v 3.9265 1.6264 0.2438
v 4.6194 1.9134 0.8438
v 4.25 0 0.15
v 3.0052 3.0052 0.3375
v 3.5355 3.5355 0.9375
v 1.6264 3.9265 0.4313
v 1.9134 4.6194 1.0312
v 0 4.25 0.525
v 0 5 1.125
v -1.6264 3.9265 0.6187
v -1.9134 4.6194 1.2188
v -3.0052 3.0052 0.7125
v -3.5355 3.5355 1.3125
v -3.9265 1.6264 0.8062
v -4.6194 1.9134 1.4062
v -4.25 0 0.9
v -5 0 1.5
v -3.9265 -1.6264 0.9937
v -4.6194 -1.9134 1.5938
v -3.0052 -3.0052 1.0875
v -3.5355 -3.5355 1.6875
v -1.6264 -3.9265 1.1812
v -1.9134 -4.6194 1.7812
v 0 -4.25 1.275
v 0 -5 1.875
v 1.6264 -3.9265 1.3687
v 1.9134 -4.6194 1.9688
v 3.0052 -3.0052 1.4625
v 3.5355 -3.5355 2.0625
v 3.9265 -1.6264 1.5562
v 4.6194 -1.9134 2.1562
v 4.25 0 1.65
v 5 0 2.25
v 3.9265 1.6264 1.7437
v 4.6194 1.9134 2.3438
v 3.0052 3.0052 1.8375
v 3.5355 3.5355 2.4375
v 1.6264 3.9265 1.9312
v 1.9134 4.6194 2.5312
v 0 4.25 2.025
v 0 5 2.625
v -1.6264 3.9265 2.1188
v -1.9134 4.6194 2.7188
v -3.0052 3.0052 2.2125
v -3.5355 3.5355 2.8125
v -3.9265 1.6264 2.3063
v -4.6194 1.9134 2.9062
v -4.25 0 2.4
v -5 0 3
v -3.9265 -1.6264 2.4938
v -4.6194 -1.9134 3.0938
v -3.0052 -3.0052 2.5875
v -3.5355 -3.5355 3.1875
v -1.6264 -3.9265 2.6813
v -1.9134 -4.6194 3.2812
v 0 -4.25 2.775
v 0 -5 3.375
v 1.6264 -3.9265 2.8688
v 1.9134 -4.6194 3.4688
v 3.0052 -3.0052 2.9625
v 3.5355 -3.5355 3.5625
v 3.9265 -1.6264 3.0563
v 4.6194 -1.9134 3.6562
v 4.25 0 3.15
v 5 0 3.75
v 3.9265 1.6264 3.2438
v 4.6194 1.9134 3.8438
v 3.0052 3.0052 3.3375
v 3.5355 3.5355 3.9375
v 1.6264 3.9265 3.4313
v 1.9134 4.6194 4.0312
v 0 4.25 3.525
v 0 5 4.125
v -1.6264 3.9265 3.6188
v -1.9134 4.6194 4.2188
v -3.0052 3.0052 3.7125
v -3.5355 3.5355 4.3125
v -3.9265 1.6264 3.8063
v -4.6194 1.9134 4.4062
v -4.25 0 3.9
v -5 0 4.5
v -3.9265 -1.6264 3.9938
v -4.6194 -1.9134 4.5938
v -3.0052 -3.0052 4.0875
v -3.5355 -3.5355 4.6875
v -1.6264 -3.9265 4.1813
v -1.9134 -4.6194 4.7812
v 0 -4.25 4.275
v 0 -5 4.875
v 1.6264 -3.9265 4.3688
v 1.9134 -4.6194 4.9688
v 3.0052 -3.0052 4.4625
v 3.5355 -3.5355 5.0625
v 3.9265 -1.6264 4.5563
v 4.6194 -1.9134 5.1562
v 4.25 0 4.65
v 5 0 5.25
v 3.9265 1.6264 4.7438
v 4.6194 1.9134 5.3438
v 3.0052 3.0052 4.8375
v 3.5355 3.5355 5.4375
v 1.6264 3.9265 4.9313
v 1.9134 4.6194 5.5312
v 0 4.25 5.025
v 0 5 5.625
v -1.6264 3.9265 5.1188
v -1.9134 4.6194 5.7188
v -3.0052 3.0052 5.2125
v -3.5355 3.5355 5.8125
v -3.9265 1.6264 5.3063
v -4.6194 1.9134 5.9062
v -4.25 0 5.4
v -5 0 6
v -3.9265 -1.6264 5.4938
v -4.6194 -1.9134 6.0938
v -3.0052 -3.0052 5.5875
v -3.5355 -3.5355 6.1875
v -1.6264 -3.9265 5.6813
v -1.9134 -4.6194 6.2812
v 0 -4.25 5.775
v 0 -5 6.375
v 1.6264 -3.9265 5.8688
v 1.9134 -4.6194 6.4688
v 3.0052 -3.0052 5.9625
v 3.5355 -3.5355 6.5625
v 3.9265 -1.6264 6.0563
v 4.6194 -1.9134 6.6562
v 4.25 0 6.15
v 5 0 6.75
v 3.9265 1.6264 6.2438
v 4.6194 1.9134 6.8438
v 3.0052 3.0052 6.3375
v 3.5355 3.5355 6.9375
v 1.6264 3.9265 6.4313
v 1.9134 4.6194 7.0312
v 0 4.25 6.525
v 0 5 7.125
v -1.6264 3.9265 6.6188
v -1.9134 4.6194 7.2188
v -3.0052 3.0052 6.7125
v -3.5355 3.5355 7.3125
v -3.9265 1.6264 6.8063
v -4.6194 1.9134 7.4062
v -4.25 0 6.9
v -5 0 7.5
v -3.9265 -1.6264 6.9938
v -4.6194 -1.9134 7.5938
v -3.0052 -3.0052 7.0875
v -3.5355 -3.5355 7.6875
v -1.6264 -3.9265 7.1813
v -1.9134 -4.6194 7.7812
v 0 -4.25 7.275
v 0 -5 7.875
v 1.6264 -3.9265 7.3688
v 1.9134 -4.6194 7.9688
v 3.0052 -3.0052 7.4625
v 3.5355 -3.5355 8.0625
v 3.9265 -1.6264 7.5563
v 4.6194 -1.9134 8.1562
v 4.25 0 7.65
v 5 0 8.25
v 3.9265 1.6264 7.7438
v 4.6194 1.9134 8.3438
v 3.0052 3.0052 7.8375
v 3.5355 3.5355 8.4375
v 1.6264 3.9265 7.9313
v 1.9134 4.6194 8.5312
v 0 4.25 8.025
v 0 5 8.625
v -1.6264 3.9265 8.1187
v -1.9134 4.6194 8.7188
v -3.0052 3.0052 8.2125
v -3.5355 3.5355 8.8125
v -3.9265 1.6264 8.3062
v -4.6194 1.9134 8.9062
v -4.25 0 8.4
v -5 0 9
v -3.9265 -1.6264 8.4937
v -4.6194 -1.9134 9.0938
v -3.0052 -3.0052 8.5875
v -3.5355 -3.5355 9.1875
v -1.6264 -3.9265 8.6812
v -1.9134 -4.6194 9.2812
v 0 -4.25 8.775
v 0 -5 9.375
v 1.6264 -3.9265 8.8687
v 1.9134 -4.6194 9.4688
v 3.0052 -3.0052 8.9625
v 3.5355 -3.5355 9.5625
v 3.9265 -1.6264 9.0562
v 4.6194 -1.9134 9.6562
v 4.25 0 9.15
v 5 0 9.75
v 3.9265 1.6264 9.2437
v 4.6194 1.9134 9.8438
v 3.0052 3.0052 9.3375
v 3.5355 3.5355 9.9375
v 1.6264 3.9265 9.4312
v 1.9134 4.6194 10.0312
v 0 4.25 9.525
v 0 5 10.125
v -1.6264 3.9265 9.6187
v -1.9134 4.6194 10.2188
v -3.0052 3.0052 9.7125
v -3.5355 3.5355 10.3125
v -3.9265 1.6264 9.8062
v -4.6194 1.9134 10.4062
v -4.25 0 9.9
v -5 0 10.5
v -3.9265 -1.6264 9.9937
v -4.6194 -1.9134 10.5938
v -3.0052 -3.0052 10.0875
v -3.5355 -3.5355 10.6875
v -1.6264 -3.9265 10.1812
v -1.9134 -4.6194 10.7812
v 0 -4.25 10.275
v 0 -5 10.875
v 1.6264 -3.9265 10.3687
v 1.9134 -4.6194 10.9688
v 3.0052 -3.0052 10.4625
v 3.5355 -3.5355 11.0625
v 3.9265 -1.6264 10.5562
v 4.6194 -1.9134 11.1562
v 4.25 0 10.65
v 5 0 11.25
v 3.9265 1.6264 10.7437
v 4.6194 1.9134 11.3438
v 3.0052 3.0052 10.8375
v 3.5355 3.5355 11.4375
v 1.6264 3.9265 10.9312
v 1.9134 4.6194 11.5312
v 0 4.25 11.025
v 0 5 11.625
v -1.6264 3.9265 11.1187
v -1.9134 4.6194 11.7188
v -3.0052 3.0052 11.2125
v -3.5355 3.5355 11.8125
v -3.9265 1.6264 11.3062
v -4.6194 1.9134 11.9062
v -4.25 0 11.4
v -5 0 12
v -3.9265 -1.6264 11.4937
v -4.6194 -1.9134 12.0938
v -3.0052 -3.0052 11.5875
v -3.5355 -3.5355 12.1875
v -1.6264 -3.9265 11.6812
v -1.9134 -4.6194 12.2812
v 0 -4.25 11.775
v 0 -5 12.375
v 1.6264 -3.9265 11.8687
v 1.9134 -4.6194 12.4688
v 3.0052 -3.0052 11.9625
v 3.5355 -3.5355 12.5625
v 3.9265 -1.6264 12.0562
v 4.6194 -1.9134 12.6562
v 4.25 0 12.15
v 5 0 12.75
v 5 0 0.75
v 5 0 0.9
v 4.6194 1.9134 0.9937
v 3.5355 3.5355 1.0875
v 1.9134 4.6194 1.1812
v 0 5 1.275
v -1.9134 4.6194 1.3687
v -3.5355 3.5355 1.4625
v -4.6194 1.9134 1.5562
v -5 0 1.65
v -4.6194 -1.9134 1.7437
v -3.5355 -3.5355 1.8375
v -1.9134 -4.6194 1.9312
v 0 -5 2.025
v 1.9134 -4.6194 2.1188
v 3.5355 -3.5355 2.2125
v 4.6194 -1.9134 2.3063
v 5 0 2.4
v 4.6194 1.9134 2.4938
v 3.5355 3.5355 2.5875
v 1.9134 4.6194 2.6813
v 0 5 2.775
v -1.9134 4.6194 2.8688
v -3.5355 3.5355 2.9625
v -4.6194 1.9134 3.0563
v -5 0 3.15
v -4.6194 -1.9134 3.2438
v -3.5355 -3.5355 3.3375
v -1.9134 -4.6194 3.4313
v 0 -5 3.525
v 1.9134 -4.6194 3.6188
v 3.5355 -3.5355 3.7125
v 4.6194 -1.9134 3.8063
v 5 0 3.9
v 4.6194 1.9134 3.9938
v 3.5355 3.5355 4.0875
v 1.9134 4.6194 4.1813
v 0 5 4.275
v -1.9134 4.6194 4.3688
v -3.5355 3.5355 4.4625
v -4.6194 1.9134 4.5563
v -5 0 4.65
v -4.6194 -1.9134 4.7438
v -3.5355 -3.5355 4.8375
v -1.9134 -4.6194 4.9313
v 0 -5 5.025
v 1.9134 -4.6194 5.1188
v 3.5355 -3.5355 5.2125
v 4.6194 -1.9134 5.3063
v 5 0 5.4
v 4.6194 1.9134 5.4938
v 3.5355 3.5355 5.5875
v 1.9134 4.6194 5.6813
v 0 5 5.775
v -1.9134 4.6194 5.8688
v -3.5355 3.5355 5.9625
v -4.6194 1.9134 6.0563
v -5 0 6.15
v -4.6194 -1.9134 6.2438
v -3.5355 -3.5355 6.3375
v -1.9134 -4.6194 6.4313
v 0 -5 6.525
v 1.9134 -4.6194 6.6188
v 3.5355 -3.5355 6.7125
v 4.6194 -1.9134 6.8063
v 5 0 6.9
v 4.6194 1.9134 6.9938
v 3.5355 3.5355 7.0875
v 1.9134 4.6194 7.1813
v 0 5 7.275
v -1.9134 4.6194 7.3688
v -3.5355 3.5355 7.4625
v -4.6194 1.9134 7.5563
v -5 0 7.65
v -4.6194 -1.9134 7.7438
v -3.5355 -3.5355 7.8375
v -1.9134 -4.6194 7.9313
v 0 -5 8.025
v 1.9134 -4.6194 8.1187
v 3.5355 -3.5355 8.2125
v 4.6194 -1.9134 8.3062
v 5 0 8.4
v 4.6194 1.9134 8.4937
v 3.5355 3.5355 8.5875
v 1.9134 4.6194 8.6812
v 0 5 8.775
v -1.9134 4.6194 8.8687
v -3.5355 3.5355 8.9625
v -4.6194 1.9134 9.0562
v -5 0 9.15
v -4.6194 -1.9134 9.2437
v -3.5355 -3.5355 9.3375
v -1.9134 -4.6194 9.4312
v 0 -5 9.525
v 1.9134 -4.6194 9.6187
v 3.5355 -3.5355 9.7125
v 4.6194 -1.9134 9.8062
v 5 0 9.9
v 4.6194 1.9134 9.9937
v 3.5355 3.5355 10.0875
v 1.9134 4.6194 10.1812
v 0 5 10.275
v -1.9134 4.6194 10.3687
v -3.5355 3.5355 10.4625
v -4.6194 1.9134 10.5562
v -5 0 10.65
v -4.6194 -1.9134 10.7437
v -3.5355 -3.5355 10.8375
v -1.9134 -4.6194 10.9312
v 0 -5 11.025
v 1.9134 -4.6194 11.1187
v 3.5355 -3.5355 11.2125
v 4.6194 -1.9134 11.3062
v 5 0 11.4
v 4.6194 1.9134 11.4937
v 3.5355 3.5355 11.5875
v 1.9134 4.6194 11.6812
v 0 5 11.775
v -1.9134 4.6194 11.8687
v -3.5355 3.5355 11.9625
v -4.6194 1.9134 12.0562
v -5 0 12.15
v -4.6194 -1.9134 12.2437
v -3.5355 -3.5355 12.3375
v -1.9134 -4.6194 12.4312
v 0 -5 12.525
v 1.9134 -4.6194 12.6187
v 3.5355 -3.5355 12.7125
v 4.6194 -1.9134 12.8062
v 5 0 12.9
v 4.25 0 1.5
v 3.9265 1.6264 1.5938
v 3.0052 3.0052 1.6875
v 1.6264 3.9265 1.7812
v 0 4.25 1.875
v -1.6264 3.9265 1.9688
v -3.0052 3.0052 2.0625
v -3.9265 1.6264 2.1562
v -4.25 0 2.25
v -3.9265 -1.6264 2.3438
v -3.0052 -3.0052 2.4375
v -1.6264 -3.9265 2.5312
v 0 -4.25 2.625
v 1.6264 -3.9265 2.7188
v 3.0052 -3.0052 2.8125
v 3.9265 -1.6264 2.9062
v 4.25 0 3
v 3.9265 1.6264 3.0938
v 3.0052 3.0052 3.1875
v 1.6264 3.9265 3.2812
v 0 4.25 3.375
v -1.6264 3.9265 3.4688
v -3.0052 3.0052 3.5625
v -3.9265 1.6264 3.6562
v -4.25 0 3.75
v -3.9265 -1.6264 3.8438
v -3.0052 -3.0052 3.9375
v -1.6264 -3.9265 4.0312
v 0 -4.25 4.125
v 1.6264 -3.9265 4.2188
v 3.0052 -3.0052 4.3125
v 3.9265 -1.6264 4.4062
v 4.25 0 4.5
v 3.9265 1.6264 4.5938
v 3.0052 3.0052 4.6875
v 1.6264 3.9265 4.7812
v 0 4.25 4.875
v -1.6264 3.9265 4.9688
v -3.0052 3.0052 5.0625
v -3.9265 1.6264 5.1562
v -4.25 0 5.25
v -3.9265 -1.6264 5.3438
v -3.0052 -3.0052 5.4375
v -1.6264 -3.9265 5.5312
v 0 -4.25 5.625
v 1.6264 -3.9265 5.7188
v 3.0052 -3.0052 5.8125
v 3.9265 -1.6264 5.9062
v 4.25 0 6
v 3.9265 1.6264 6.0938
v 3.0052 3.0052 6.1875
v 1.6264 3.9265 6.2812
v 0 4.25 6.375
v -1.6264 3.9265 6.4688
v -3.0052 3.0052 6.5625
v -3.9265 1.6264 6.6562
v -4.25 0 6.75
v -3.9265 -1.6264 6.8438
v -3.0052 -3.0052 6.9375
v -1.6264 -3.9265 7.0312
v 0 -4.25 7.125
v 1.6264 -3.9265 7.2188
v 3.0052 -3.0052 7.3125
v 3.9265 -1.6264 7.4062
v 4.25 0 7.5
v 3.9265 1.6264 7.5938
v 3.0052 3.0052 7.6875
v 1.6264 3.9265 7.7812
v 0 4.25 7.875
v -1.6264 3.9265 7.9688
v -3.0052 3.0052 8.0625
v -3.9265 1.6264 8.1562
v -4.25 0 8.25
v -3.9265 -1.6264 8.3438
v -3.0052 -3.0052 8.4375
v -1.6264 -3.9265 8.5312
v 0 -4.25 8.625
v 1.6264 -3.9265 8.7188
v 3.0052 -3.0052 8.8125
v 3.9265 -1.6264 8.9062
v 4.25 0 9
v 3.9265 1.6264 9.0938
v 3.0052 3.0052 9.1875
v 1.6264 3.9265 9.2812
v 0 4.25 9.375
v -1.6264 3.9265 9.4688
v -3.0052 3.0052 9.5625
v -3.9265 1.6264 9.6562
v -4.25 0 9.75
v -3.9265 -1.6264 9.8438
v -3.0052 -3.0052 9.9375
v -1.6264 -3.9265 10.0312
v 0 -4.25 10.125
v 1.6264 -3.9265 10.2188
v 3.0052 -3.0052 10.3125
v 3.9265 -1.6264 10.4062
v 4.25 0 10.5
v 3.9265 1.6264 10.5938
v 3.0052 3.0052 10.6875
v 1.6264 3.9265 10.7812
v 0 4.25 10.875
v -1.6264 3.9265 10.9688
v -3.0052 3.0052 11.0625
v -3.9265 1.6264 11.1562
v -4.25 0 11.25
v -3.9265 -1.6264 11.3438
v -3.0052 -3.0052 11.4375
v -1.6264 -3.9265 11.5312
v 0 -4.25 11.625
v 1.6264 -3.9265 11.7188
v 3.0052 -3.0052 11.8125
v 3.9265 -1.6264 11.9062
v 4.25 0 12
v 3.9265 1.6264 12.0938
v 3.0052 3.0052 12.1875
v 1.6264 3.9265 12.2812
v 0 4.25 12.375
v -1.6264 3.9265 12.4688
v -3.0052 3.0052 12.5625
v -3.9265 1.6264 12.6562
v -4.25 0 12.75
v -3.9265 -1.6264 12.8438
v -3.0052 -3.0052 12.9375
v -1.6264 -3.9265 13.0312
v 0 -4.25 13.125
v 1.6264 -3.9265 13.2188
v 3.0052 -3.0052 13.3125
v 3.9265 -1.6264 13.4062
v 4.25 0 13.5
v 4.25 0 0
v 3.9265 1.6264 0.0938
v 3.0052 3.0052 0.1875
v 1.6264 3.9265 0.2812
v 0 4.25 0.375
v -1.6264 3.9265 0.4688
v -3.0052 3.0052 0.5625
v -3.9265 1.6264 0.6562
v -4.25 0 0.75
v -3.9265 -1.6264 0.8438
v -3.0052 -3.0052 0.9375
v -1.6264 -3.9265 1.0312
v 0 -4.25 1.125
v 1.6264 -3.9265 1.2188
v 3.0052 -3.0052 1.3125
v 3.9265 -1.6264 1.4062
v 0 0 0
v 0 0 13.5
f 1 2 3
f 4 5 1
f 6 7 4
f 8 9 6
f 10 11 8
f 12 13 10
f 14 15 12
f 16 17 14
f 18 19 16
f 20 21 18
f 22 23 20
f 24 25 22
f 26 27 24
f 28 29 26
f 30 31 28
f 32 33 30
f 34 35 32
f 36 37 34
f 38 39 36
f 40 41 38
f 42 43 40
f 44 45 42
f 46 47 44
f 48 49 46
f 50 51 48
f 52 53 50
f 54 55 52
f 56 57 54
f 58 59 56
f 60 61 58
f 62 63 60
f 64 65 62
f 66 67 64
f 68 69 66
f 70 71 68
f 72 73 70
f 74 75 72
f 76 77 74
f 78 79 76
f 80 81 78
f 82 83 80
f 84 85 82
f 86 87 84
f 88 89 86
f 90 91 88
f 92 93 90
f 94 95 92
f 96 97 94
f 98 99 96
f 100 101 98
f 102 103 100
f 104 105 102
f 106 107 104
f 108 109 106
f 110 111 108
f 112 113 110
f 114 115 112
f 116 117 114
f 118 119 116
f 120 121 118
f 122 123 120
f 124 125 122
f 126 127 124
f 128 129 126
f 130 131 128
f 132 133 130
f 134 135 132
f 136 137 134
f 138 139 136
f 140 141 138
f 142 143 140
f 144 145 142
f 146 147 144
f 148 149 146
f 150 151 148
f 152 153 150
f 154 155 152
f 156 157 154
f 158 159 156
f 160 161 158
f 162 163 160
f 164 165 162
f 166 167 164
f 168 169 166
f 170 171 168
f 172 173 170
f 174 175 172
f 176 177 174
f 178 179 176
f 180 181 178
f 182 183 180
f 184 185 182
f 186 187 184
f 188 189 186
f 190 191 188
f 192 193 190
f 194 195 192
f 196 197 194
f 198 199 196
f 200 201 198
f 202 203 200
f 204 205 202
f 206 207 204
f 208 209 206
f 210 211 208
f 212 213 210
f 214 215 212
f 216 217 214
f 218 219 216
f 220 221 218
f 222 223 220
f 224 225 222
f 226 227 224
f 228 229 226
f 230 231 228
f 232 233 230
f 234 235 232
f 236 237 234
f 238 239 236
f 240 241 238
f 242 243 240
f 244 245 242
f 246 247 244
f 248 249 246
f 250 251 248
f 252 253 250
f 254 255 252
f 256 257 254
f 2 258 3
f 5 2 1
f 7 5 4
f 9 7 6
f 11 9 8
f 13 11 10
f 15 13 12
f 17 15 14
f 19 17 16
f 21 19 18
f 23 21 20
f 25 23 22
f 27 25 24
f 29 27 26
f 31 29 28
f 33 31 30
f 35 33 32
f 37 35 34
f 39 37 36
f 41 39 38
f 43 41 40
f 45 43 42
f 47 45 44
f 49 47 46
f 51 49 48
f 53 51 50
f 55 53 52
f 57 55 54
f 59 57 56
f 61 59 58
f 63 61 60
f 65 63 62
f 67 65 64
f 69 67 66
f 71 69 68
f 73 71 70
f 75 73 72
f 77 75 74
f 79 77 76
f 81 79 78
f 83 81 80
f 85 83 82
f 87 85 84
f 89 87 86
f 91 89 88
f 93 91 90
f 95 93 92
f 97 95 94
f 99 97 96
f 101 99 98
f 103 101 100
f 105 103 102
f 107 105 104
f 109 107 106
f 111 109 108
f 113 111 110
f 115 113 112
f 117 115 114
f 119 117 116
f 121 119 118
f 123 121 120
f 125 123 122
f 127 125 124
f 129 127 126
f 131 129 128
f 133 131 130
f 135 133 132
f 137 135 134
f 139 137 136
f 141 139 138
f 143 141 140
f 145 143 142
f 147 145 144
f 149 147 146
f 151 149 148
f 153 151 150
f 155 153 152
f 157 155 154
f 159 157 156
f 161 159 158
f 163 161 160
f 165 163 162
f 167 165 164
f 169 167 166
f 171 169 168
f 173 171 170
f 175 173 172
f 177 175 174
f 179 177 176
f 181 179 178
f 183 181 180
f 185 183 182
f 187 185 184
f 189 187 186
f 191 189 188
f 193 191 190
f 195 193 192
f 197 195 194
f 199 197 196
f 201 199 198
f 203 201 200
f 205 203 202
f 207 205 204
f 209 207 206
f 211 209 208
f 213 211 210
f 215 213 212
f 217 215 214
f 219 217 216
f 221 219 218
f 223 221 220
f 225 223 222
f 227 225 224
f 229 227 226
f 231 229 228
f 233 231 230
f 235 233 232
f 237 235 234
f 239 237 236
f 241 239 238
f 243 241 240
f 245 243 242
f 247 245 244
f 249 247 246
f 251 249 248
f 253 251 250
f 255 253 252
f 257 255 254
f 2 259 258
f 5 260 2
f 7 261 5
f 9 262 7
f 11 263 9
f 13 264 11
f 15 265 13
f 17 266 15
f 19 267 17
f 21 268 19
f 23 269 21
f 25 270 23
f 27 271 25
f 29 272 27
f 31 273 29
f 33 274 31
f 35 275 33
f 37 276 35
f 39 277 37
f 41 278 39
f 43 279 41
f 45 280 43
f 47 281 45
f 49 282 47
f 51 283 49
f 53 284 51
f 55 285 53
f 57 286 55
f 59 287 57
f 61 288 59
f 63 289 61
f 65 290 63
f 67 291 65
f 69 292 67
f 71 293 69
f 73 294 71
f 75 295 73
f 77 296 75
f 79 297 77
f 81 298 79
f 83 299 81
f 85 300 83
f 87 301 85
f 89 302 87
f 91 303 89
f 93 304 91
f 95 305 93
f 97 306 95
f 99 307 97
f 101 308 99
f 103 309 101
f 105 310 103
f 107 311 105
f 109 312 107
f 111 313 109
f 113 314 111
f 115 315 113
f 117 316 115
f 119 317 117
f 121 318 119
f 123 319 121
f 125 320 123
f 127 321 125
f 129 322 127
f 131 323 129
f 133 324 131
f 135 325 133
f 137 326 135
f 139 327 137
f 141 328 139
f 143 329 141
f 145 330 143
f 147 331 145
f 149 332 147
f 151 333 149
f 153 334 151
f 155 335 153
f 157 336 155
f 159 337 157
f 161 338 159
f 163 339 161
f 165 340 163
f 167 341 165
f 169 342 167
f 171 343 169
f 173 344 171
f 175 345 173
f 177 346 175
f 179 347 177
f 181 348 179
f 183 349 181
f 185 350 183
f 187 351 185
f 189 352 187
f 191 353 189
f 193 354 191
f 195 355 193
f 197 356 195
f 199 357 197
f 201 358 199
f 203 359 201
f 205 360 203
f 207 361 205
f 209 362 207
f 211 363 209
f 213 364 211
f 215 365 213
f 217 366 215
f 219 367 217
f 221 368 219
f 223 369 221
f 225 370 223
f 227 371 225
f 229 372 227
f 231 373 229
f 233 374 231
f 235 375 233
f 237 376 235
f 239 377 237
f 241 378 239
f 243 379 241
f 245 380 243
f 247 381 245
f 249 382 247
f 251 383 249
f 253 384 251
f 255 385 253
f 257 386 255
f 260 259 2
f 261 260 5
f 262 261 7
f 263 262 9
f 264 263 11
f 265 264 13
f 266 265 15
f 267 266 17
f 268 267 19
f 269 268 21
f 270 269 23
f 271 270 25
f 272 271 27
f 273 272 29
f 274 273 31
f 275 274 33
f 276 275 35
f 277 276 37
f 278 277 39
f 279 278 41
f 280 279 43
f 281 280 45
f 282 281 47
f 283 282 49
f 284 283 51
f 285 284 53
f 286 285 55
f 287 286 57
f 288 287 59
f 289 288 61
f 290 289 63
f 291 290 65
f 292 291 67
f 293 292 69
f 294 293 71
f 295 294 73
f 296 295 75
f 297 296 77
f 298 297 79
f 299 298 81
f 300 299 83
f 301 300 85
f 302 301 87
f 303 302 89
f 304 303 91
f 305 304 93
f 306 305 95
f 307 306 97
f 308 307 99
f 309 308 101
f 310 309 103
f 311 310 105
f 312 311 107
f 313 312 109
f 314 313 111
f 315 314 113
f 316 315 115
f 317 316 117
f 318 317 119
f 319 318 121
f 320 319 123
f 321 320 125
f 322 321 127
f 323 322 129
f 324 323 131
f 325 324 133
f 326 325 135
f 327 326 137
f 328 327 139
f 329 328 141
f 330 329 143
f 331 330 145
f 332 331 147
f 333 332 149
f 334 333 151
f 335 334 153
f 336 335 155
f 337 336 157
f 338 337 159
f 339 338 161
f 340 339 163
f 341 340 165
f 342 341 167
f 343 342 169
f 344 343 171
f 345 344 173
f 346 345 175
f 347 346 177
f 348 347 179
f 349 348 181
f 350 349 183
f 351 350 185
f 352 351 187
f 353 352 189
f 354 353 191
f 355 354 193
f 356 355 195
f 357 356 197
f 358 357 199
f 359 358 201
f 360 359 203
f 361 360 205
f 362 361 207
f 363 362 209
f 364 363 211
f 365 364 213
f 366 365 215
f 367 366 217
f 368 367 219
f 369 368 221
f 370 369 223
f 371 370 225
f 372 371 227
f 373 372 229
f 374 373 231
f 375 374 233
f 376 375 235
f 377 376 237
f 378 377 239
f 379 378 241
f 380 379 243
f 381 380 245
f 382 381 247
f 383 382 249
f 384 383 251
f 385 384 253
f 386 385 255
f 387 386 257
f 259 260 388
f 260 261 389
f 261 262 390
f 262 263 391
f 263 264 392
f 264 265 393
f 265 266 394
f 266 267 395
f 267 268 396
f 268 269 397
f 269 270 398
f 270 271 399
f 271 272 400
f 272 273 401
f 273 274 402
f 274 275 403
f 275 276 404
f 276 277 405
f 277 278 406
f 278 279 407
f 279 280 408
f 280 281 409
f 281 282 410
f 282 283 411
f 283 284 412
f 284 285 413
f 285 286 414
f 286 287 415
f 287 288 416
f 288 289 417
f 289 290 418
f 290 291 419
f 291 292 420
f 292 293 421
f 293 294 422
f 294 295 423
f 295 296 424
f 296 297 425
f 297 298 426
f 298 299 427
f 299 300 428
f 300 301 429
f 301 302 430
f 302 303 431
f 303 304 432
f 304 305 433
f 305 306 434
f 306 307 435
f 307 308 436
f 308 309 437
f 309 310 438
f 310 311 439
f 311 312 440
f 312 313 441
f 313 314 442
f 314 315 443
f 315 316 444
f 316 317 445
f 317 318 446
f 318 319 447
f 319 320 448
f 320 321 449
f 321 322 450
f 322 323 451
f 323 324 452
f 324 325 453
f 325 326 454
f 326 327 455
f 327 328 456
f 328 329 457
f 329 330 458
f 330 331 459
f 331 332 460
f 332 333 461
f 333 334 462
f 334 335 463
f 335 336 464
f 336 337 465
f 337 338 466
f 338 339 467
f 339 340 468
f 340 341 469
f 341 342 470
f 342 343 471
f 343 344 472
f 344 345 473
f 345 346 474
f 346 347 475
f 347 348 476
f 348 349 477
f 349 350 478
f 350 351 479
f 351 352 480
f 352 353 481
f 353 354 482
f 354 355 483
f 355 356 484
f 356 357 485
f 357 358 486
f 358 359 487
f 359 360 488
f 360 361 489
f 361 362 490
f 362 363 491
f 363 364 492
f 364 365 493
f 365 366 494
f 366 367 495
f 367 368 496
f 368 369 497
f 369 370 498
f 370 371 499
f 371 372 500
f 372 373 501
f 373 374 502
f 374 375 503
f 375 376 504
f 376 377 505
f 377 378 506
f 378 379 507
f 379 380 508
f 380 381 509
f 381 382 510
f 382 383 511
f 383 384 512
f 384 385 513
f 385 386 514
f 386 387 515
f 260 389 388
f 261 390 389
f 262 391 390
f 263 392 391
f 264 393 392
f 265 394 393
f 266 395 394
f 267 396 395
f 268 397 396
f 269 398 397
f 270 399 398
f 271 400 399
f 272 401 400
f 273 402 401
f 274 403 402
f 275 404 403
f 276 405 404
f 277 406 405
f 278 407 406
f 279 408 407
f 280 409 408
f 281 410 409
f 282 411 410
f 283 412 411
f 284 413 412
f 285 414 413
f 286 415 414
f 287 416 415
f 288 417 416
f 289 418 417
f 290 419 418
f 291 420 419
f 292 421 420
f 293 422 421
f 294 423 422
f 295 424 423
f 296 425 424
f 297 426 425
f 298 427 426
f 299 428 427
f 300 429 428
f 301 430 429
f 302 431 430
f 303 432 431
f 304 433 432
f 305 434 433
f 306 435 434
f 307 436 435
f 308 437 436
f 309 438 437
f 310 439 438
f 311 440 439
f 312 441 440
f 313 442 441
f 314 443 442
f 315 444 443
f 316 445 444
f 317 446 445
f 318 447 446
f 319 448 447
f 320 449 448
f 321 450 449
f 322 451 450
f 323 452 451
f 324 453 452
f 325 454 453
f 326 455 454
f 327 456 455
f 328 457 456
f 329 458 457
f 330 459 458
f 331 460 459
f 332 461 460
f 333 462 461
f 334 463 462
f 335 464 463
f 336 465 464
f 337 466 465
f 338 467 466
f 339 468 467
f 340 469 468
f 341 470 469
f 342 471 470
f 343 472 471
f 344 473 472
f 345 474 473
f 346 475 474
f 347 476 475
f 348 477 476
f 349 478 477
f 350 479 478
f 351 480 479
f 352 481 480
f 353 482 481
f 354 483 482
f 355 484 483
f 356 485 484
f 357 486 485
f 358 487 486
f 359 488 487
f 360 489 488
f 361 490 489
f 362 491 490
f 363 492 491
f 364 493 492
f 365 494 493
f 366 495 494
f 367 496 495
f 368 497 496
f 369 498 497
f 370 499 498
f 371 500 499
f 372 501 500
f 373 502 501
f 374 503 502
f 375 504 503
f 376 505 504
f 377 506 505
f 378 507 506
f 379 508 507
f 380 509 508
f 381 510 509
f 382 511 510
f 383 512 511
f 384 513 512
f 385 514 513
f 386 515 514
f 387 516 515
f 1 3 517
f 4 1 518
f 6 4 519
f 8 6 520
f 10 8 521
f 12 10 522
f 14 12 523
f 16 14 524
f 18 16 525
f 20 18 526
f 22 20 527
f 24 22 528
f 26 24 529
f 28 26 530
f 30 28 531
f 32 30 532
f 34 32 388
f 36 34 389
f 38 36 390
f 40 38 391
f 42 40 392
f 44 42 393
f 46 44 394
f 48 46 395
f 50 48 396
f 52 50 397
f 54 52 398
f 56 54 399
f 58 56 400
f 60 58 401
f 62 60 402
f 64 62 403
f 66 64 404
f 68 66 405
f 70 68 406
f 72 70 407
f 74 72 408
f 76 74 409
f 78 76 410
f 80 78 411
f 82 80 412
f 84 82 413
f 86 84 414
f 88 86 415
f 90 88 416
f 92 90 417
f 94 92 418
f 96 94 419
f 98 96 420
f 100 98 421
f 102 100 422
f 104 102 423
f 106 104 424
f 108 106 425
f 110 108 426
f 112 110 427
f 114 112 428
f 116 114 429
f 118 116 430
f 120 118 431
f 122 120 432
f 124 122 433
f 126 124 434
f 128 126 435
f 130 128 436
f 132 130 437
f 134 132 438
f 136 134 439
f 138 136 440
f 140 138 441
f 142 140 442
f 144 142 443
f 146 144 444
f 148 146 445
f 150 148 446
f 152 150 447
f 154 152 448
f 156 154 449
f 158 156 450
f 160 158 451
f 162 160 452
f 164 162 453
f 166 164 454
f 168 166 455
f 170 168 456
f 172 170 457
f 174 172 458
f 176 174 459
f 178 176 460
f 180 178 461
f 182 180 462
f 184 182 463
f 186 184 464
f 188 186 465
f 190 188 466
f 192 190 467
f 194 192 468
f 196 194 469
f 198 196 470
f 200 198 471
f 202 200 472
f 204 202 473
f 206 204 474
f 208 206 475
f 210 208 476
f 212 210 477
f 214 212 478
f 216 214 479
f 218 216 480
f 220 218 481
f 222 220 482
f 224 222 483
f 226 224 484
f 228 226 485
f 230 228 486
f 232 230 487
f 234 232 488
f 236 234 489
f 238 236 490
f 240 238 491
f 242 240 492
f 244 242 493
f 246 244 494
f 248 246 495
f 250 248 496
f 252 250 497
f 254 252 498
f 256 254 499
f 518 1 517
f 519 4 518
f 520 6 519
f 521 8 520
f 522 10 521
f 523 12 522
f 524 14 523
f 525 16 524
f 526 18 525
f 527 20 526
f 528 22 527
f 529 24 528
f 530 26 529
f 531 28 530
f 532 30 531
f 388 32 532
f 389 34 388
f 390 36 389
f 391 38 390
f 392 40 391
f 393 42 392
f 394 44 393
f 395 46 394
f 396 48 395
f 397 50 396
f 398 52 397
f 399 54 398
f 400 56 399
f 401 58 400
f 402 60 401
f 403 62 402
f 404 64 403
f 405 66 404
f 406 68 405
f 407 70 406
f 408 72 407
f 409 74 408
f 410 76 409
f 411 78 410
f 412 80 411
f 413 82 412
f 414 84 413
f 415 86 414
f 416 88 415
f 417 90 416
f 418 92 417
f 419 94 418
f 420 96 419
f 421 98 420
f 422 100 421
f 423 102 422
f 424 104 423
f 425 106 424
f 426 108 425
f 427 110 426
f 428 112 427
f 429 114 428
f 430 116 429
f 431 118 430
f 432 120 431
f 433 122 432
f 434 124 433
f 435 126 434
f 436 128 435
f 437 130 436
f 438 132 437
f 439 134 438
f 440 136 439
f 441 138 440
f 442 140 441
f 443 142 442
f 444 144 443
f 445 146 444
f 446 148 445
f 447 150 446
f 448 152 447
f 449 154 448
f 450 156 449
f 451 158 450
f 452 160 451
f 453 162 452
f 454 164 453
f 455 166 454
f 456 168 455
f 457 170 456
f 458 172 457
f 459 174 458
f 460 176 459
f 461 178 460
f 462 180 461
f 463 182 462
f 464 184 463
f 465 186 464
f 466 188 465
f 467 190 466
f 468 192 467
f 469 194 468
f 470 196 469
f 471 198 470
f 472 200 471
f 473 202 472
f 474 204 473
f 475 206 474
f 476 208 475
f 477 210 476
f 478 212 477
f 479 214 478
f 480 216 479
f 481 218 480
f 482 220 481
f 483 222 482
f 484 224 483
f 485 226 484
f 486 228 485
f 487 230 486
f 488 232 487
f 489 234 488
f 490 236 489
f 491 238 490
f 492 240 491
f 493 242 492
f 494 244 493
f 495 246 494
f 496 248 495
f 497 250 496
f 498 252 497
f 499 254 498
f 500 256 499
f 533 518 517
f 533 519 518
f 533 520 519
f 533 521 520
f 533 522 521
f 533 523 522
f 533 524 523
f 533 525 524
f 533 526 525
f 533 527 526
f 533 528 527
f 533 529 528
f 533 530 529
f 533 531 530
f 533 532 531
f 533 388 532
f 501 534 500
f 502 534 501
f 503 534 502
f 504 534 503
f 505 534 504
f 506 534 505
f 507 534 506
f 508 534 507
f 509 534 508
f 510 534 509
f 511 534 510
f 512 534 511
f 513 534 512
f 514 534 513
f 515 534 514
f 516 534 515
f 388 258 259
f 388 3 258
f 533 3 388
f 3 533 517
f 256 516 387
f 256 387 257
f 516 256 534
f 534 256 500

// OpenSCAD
/*
* Written by Johnny, published on Thingiverse
* for suggestions please contact me via jcernato@gmail.com
* Version 30.01.2017_Experimental
*/
 
// $fn=360;
s_thread(10,1.5,12);

module s_thread(diameter, slope, height) {
    if($fn) {mypolygon(diameter, slope, $fn, height);}
    else {mypolygon(diameter, slope, 16, height); }
}

module mypolygon(diameter, slope, polygons, height) {
    n = polygons;
    d = diameter;
    k = slope;
/* Shape:
    g___d
    |    \
    |      \ c
    |       |
    |      / b
    |   a /
    |   |
    ----
    f   e
    */
    m = round(height/slope);
  
echo (height/slope);
    
function cosinus(n,i) = (cos((360/n)*i));
function sinus(n,i) = (sin((360/n)*i));
//function height(k,n,i,offset) = (k/n*i+offset*k)>height ? height : (k/n*i+offset*k)<0 ? 0 : (k/n*i+offset*k);
function height(k,n,i,offset) = (k/n*i+offset*k);
off2=1;    
points = [
/* A */  for(i=[0:n*m]) [(d-k)/2*cosinus(n,i),(d-k)/2*sinus(n,i),height(k,n,i,-0.9+off2)],
/* B */  for(i=[0:n*m]) [d/2*cosinus(n,i),d/2*sinus(n,i),height(k,n,i,-0.5+off2)],
/* C */  for(i=[0:n*m]) [d/2*cosinus(n,i),d/2*sinus(n,i),height(k,n,i,-0.4+off2)],
/* D */  for(i=[0:n*m]) [(d-k)/2*cosinus(n,i),(d-k)/2*sinus(n,i),height(k,n,i,0+off2)],
/* E */  for(i=[0:n*m]) [(d-k)/2*cosinus(n,i),(d-k)/2*sinus(n,i),height(k,n,i,-1+off2)],
/* F */  [0,0,height(k,n,0,-1+off2)],
/* G */  [0,0,height(k,n,n*m,0+off2)],
];

faces = [
/* === lower-faces === */
  for (i=[0:n*m-1]) [i, i+n*m+2, i+1],
  for (i=[0:n*m-1]) [i, i+n*m+1, i+n*m+2],
      
/* === vertical-outside-faces === */
  for (i=[0:n*m-1]) [i+n*m+1, i+n*m*2+2, i+n*m+2],
  for (i=[0:n*m-1]) [i+n*m+2, i+n*m*2+2, i+n*m*2+3],
      
/* === upper-faces === */
  for (i=[0:n*m-1]) [i+n*m*3+3, i+n*m*2+3, i+n*m*2+2],
  for (i=[0:n*m-1]) [i+n*m*3+3, i+n*m*3+4, i+n*m*2+3],
    
/* === vertical-inner-faces === */
  for (i=[0:n*m-1]) [i+n*m*4+4, i, i+1],
  for (i=[0:n*m-1]) [i+n*m*4+4, i+1, i+n*m*4+5],
    
/* === bottom-faces === */
  for(i=[1:n]) [i+n*m*4+3, i+n*m*4+4, 1+n*m*5+4],
  //for(i=[1:n]) [i+n*m*4+4,i+n*m*5+5, i+n*m*5+4],
      
/* === top-faces === */
  for(i=[0:n-1]) [i+n*m*4-n+3, 2+n*m*5+4, i+n*m*4-n+4],

/* === lower-sidewall (endstop) === */
  [n*m*3+3, n*m*2+2, n*m+1, 0, n*m*4+4, n*m*5+5],
  
/* === upper-sidewall (endstop) === */
  [n*m, n*m*2+1, n*m*3+2, n*m*4+3, n*m*5+6, n*m*4-n+3]
]; 

polyhedron(points, faces, convexity=2);
  
}
